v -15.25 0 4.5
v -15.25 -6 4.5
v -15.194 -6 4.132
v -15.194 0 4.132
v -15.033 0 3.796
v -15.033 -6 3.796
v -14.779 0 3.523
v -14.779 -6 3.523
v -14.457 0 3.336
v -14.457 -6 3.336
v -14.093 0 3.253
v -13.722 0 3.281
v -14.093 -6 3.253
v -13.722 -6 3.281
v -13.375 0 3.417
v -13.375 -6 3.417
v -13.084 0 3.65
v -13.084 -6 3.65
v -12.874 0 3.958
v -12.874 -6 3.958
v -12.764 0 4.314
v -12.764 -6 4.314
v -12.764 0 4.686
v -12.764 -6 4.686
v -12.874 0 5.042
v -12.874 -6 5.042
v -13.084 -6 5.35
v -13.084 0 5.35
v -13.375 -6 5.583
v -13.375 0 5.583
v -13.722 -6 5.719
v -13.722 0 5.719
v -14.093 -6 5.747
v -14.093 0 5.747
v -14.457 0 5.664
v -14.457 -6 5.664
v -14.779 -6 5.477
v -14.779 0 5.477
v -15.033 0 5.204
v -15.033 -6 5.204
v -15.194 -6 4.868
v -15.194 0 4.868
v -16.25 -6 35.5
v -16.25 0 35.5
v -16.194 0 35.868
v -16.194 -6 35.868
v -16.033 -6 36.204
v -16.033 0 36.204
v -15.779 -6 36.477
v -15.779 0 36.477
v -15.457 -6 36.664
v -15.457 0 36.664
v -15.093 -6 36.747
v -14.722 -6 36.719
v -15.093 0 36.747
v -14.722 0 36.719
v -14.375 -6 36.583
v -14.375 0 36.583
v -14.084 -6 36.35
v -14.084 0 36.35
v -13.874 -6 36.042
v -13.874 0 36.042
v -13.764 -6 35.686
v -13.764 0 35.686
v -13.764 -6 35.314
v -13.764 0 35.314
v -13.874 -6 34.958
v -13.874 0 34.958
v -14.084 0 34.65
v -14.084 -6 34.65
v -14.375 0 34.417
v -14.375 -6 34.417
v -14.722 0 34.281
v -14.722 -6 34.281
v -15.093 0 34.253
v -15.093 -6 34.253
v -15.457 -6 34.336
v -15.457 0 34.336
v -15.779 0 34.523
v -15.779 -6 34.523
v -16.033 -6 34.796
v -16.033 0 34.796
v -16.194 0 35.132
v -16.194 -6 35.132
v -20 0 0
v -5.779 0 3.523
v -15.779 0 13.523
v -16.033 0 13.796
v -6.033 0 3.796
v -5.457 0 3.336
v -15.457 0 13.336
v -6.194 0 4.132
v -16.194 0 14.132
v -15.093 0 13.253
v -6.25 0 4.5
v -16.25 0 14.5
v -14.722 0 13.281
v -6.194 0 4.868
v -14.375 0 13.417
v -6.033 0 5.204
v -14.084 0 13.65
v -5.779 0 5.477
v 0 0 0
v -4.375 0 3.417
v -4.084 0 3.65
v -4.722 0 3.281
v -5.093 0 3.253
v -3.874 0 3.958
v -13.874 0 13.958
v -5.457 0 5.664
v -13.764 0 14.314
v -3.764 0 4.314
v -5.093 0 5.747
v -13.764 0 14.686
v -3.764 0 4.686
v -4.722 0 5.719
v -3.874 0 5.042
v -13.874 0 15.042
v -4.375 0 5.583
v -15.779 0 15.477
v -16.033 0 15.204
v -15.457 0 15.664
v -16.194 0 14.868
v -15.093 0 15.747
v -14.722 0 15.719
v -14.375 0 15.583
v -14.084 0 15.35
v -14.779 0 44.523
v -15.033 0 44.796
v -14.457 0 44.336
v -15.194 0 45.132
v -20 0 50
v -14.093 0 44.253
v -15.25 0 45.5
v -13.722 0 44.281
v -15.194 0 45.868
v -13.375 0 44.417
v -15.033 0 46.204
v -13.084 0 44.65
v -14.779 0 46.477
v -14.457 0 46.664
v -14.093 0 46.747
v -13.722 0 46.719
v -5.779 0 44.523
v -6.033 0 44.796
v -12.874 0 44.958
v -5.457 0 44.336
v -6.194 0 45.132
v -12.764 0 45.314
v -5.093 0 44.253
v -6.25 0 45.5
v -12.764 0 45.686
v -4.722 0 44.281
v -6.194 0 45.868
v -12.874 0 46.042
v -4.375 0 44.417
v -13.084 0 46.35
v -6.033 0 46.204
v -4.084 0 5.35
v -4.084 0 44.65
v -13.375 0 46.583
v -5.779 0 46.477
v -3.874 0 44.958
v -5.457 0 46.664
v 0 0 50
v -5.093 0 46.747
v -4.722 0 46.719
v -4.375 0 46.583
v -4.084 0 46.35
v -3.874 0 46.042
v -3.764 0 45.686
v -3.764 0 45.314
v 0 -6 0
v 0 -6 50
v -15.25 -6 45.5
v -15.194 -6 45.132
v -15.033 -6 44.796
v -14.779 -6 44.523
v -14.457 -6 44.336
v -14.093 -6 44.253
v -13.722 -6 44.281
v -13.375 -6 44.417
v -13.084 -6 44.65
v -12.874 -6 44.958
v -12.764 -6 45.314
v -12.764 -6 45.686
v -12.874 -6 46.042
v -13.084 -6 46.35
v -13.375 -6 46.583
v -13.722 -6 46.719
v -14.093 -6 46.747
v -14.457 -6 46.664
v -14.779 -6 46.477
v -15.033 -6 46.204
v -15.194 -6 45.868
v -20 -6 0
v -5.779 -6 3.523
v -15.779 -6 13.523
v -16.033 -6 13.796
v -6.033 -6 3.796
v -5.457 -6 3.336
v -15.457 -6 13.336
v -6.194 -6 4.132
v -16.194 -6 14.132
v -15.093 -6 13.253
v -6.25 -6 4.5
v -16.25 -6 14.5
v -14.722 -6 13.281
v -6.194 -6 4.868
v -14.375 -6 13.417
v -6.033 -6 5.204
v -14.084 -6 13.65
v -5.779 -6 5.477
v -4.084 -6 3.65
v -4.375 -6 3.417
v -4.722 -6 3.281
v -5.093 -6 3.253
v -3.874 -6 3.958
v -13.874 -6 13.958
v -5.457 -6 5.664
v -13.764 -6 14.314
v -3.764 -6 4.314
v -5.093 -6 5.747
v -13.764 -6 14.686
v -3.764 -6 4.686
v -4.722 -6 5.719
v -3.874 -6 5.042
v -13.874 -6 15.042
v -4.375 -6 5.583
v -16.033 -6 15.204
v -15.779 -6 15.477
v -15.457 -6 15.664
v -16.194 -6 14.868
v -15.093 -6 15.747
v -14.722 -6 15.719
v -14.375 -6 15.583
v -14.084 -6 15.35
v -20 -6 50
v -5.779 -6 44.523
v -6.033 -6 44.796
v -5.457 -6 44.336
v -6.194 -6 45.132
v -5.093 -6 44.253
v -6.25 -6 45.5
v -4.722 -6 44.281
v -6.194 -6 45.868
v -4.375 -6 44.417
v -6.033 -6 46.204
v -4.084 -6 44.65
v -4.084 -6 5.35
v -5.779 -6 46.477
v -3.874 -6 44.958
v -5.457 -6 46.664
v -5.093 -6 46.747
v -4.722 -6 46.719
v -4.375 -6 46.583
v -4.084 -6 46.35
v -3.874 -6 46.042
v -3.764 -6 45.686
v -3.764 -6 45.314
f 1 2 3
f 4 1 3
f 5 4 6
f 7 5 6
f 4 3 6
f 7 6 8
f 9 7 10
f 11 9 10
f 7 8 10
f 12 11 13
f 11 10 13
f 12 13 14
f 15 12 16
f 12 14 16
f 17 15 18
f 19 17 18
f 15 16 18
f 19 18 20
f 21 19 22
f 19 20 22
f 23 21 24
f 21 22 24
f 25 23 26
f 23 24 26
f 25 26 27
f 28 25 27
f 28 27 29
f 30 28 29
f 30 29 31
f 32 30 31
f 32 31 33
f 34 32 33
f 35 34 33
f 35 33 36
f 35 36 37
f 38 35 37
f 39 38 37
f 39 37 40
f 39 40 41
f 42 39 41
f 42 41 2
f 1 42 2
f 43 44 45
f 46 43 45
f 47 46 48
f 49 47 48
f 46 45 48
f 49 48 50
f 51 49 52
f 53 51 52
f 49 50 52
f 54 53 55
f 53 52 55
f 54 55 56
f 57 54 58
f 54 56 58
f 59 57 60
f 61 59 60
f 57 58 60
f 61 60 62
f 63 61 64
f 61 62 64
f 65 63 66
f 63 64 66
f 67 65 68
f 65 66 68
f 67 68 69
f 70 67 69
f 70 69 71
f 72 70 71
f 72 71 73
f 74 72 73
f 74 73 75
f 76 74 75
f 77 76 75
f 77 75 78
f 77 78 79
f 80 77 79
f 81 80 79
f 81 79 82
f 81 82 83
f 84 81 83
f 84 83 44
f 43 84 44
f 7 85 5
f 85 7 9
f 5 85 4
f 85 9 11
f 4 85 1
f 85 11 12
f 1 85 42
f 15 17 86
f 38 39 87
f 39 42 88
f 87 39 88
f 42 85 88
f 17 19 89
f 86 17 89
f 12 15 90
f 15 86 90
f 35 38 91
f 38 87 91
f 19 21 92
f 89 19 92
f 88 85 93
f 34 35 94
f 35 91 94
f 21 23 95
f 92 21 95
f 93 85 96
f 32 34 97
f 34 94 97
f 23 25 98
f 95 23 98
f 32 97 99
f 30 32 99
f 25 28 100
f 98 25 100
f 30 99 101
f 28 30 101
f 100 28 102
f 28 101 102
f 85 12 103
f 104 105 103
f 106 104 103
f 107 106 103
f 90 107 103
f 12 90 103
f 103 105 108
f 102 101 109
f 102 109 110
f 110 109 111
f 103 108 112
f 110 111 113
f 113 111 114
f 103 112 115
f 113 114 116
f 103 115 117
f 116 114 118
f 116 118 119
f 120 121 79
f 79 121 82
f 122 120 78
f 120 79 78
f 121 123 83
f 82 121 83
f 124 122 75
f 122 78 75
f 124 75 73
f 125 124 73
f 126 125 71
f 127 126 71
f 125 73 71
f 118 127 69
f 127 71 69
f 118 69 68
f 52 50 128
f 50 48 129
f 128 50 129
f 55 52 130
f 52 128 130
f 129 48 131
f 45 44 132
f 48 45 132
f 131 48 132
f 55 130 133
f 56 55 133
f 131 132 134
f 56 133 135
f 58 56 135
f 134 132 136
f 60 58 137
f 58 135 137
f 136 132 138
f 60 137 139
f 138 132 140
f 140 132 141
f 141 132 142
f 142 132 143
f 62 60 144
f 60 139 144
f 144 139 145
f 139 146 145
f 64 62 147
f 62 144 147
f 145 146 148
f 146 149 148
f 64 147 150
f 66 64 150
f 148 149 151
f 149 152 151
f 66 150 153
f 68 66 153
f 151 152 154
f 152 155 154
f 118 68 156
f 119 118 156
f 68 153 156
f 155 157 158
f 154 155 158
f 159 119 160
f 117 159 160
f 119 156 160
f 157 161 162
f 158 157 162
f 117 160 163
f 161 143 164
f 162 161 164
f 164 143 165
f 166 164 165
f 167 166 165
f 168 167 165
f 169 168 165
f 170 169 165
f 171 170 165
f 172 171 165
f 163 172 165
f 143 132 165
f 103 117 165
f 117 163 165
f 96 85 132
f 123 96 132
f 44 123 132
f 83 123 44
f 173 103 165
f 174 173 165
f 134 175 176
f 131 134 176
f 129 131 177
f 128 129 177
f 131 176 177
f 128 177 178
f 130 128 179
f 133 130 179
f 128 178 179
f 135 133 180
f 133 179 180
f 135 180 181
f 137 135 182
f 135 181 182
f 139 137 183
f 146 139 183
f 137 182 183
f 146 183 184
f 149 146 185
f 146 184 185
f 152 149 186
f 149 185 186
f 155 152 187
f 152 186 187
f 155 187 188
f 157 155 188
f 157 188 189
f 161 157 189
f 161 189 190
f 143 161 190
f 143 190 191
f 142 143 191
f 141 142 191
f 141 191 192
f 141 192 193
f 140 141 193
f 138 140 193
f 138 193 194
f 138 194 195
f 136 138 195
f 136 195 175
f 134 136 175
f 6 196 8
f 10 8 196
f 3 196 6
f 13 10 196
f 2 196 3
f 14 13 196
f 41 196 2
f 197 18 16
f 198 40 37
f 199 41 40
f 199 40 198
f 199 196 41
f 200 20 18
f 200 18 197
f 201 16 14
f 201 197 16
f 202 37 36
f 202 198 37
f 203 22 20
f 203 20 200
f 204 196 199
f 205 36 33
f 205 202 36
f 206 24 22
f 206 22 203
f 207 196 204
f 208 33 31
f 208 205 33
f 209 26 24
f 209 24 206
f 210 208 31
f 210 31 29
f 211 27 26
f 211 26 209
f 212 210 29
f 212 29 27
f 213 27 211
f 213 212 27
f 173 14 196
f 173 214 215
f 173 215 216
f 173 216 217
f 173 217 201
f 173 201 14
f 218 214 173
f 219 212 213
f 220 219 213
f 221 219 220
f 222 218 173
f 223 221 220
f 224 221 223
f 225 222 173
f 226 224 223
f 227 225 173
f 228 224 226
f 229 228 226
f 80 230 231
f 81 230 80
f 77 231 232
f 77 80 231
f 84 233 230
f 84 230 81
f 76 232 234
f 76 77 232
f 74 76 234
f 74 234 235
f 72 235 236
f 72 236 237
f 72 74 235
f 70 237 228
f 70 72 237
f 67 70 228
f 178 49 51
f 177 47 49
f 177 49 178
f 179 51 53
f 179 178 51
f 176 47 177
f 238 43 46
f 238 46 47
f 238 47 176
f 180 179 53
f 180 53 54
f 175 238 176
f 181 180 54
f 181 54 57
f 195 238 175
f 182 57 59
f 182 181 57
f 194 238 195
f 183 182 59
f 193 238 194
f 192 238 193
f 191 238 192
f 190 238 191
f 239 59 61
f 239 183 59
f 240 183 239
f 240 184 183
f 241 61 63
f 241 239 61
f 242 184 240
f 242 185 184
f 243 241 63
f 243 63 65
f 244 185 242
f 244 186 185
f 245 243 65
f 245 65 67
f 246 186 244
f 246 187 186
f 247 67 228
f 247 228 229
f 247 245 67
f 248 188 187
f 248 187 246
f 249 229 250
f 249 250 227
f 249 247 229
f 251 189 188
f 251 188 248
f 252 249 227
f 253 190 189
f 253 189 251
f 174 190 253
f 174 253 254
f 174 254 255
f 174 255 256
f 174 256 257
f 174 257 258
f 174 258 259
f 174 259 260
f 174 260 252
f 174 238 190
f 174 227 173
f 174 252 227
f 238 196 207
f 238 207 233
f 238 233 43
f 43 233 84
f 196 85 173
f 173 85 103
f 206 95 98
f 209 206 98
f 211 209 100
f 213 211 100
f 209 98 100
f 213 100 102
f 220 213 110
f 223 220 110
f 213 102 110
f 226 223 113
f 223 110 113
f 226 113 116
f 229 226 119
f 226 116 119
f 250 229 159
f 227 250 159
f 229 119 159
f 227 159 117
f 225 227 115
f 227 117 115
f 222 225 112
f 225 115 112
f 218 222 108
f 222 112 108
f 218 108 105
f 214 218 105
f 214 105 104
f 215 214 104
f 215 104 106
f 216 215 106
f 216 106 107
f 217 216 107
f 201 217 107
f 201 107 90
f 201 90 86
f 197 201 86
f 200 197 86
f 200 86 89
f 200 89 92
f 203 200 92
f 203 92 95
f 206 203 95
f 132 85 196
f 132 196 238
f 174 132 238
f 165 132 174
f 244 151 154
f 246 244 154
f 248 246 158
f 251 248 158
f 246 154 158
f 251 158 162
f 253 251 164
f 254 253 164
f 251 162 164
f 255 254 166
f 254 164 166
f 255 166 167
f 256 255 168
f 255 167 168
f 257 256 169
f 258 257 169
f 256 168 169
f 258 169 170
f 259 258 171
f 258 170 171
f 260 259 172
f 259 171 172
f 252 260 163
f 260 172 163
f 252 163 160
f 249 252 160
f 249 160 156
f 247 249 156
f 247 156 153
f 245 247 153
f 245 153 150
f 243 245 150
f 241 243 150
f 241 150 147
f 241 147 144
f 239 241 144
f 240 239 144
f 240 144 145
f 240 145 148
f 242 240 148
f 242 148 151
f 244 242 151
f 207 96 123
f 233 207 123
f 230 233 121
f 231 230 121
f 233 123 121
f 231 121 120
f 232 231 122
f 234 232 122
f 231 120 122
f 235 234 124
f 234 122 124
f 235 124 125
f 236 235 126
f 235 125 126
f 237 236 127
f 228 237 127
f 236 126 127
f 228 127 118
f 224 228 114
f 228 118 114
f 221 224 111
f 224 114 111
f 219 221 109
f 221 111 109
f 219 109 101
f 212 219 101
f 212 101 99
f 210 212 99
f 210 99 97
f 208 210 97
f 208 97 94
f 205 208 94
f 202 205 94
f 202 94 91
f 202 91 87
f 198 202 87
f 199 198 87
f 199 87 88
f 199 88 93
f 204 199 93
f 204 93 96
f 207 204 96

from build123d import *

# Parameters (mm, degrees)
F0_W     = 20
F0_H     = 50
F1_DEPTH = 6
F3_D     = 2.5
F5_D     = 2.5


with BuildPart() as f1:
    # F0 (on Front) → F1 (new body)
    with BuildSketch(Plane.XZ):
        with Locations((-10, 25)):
            Rectangle(F0_W, F0_H)
    extrude(amount=F1_DEPTH)

    # F3 (through all)
    with Locations(Plane.XZ.offset(6)):
        with Locations((-5, 45.5), (-5, 4.5), (-15, 14.5), (-15, 35.5)):
            Hole(F3_D / 2)

    # F5 (through all)
    with Locations(Plane(origin=(0, 0, 0), x_dir=(1, 0, 0), z_dir=(0, 1, 0))):
        with Locations((-14, -45.5), (-14, -4.5)):
            Hole(F5_D / 2)


solid = f1.part
